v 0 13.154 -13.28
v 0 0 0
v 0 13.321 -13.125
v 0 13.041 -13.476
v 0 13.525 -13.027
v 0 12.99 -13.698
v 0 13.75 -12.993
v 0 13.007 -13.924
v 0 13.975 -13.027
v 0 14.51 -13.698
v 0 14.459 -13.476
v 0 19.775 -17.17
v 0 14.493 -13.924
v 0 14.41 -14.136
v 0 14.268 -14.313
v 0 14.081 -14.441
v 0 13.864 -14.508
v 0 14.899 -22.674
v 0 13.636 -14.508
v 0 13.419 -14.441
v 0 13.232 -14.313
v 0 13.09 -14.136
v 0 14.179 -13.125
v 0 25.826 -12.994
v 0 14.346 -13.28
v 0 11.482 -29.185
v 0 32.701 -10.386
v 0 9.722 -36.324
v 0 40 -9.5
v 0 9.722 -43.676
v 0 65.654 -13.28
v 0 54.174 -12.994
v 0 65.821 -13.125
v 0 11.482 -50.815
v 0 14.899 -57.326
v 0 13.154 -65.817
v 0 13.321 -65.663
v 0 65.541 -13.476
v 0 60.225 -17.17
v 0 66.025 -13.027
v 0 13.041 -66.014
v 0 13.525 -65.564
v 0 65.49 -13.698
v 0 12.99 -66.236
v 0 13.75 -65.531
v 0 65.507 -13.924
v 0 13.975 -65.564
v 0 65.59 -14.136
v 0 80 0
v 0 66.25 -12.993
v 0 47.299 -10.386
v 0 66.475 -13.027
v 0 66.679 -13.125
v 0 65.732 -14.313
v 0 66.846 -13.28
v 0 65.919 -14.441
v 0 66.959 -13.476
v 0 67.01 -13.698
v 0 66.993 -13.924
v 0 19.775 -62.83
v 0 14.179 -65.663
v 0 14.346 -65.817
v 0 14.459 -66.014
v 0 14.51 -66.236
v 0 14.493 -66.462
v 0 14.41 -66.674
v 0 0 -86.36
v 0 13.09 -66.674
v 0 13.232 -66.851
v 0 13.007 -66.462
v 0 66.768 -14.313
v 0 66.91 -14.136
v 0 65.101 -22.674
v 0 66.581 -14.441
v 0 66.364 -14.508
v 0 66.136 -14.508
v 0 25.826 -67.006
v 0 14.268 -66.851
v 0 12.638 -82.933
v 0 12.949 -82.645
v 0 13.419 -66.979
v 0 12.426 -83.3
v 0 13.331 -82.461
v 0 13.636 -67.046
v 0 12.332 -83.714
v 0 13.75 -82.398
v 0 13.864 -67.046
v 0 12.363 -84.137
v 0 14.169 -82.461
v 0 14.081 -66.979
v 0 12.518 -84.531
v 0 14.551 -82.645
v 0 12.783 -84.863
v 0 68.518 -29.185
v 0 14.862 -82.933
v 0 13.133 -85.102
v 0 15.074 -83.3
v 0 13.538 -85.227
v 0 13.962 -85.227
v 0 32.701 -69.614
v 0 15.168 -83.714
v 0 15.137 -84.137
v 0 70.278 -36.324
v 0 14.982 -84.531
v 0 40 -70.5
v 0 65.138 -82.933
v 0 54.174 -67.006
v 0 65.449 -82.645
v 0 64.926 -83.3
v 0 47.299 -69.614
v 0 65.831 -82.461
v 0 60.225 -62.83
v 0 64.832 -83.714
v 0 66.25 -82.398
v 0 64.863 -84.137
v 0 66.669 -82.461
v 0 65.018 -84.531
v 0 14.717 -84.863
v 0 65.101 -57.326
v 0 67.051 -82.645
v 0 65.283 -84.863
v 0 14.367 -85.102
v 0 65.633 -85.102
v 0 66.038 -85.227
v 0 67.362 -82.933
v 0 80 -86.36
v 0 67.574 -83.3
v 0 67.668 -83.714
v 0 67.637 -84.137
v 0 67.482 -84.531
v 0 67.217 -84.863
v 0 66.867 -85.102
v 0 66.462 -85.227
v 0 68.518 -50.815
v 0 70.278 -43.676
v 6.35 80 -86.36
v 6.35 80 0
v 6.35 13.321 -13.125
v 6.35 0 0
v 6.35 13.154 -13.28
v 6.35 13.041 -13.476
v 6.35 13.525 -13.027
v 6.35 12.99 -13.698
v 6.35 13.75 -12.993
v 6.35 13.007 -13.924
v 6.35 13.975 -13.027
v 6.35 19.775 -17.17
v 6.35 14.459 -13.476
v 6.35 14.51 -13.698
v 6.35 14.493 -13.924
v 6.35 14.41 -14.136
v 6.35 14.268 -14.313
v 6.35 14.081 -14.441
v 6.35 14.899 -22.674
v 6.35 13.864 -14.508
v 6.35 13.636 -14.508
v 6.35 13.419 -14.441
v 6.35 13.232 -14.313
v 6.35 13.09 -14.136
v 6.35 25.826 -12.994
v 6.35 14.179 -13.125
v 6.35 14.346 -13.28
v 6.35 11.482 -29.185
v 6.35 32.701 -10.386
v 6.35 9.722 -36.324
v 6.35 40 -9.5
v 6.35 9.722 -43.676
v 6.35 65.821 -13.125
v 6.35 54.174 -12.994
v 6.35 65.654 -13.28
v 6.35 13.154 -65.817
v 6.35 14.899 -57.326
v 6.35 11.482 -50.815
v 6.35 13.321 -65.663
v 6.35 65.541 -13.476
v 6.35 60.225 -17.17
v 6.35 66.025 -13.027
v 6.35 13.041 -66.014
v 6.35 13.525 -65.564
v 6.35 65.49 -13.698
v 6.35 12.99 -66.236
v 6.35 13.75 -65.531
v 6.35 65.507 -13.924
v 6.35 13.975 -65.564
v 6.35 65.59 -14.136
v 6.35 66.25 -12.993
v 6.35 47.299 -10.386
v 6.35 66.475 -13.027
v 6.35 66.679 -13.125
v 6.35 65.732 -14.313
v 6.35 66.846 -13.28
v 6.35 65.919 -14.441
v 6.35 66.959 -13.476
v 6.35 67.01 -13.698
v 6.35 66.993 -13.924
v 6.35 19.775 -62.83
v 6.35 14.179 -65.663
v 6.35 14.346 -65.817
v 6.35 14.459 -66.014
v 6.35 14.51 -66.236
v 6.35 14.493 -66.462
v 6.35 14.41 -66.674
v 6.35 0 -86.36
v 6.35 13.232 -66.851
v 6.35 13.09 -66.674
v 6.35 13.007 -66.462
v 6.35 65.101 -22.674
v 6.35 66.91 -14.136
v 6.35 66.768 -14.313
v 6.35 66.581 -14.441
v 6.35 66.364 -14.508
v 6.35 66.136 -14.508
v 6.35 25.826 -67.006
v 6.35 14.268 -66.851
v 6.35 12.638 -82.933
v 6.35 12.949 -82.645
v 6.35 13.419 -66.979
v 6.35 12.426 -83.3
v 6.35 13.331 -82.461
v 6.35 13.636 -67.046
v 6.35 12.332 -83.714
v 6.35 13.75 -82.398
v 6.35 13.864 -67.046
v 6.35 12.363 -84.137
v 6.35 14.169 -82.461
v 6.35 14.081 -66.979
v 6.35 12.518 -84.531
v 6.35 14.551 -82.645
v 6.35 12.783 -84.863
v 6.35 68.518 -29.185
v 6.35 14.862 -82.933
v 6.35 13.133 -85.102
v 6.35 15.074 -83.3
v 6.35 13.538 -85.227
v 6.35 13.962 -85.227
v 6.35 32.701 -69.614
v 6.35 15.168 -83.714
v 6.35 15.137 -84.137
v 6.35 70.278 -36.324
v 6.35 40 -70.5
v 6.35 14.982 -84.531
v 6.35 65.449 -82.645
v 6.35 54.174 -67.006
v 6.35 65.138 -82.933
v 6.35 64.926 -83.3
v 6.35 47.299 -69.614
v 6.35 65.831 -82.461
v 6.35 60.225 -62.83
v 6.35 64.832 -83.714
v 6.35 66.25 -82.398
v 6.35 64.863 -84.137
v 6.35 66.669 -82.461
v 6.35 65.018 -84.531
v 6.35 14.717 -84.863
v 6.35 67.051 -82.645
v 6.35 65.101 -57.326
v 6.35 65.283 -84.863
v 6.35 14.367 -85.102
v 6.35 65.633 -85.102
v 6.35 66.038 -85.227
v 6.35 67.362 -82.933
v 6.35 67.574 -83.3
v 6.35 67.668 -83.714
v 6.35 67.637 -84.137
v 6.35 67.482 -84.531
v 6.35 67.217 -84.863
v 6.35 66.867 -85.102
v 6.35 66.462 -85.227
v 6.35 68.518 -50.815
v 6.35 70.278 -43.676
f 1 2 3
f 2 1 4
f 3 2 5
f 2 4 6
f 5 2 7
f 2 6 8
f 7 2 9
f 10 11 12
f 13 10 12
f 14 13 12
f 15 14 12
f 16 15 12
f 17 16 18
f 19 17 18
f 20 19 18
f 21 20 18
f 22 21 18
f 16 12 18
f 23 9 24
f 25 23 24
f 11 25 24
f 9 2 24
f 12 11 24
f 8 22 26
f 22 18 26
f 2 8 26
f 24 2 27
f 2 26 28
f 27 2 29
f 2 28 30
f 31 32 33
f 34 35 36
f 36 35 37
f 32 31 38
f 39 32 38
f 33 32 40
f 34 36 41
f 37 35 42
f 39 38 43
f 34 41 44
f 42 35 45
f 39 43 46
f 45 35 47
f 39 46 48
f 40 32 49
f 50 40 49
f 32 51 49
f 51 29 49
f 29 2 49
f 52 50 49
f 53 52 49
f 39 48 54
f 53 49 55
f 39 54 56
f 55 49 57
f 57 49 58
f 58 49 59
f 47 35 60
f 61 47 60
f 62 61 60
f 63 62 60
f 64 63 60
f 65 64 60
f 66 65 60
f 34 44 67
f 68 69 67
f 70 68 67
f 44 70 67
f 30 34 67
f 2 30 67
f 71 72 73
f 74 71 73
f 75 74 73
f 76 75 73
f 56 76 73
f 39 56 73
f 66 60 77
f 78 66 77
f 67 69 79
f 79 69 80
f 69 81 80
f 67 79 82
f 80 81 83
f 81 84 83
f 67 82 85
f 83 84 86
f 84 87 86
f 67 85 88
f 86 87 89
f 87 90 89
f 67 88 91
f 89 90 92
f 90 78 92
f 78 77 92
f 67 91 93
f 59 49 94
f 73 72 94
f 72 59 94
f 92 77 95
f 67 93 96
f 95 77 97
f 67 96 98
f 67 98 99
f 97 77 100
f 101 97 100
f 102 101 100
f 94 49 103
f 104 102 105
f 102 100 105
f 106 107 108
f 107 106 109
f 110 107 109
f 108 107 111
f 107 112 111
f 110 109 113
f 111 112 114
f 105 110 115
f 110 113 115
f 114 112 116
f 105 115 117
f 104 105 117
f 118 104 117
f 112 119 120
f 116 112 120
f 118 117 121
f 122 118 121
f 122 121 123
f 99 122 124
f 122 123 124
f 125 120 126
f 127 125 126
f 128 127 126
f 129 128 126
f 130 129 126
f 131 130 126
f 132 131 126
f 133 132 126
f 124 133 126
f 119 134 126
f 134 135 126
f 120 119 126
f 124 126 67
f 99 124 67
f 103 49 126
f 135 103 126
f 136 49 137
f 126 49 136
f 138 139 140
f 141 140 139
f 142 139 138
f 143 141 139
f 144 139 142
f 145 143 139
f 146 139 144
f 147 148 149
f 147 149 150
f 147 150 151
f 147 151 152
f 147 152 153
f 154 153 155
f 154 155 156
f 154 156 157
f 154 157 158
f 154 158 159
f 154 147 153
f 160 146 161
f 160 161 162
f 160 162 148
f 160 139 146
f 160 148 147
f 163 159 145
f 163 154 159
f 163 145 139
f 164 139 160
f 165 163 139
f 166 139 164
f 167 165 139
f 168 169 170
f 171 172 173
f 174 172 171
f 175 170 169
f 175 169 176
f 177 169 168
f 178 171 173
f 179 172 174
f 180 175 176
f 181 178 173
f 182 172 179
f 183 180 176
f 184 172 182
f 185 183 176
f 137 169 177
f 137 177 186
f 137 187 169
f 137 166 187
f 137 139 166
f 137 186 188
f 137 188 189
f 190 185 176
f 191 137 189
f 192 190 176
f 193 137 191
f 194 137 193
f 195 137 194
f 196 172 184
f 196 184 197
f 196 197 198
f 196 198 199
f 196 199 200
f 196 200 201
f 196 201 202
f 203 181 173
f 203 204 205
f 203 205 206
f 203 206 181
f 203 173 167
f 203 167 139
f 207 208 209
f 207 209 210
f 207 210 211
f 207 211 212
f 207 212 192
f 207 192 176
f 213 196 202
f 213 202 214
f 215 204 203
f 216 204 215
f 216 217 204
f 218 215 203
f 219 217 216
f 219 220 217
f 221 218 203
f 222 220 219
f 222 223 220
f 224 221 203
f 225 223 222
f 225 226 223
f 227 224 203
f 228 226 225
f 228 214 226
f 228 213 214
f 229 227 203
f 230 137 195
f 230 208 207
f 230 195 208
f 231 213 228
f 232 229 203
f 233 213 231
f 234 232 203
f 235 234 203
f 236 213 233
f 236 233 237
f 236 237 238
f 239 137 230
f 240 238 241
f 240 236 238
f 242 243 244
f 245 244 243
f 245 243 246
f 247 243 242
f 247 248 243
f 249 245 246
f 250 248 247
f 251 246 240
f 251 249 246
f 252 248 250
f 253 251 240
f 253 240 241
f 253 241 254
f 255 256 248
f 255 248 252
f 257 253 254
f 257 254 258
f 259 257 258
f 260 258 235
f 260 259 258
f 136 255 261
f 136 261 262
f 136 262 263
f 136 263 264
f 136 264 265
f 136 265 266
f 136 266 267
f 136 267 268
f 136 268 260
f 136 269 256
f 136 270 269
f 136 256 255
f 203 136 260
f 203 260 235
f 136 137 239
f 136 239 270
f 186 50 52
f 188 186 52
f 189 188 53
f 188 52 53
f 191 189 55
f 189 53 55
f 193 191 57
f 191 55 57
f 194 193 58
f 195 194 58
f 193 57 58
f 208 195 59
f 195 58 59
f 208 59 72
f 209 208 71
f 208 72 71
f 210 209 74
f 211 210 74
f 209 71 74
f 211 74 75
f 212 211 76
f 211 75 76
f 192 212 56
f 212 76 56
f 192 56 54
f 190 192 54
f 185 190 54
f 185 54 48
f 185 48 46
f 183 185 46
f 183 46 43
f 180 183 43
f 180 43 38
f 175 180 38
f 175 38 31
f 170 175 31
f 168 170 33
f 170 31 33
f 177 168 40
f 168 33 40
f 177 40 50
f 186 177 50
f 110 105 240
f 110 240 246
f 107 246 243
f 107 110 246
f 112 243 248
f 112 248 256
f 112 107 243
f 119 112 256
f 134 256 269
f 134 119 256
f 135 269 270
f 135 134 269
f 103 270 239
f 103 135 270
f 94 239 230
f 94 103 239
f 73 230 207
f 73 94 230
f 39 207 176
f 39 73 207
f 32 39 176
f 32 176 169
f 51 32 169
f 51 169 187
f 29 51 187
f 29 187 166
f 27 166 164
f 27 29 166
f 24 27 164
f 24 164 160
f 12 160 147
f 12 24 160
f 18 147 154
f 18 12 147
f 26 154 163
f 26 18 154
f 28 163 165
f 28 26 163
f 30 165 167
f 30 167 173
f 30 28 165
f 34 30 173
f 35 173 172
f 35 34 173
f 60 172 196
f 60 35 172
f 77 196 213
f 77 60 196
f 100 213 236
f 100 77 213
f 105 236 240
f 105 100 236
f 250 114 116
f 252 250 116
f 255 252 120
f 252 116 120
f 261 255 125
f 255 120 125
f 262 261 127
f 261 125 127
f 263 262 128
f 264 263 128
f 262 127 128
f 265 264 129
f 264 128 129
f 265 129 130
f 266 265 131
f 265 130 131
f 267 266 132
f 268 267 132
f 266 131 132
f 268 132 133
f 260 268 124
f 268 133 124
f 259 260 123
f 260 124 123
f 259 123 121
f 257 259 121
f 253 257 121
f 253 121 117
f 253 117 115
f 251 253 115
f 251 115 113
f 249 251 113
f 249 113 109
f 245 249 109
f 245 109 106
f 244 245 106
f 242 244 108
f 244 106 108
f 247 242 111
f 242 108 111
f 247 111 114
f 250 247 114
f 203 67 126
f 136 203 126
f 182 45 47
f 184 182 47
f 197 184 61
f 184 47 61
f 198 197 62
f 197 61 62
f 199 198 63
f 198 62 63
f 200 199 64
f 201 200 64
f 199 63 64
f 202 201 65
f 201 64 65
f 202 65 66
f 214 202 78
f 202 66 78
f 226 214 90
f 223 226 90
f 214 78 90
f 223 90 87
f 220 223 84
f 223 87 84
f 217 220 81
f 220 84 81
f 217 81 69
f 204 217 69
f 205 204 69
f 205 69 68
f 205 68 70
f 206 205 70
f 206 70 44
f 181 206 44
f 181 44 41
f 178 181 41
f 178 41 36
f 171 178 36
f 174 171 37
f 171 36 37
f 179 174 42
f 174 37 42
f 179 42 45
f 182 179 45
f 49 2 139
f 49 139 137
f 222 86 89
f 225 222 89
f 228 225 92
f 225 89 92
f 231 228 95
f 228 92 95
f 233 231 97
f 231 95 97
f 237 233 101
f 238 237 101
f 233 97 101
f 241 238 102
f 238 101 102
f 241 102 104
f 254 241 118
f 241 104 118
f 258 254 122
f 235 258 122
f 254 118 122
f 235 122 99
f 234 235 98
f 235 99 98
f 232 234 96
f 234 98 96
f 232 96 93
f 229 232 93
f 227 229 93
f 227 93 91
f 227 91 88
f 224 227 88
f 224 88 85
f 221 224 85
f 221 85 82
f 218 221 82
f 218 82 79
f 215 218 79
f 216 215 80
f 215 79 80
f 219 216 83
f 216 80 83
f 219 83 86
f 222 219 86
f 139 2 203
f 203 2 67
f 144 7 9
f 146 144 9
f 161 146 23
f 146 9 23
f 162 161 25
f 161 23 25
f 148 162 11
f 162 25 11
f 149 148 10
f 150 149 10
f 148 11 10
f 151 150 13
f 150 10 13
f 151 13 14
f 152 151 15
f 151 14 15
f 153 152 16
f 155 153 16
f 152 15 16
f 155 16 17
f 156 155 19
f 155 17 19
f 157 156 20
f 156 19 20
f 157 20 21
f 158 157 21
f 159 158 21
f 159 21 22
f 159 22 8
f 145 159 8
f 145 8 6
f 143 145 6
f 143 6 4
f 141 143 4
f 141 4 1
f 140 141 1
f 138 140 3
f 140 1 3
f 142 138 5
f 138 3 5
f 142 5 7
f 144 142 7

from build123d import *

# Parameters (mm, degrees)
SKETCH1_W           = 86.36
SKETCH1_H           = 80
SKETCH1_R           = 30.5
BOSS_EXTRUDE1_DEPTH = 6.35
SKETCH3_R           = 0.762
SKETCH3_R_2         = 1.4224
CUT_EXTRUDE2_DEPTH  = 6.35


with BuildPart() as part:
    # Sketch1 → Boss-Extrude1 (new body)
    with BuildSketch(Plane(origin=(0, 0, 0), x_dir=(0, 0, -1), z_dir=(1, 0, 0))):
        with Locations((43.18, 40)):
            Rectangle(SKETCH1_W, SKETCH1_H)
        with Locations((40, 40)):
            Circle(SKETCH1_R, mode=Mode.SUBTRACT)
    extrude(amount=BOSS_EXTRUDE1_DEPTH)

    # Sketch3 → Cut-Extrude2 (cut)
    with BuildSketch(Plane.ZY):
        with Locations((-66.292558248, 13.75)):
            Circle(SKETCH3_R)
        with Locations((-13.754723938, 13.75)):
            Circle(SKETCH3_R)
        with Locations((-13.754723938, 66.25)):
            Circle(SKETCH3_R)
        with Locations((-83.82, 13.75)):
            Circle(SKETCH3_R_2)
        with Locations((-83.82, 66.25)):
            Circle(SKETCH3_R_2)
    extrude(amount=-CUT_EXTRUDE2_DEPTH, mode=Mode.SUBTRACT)


solid = part.part
